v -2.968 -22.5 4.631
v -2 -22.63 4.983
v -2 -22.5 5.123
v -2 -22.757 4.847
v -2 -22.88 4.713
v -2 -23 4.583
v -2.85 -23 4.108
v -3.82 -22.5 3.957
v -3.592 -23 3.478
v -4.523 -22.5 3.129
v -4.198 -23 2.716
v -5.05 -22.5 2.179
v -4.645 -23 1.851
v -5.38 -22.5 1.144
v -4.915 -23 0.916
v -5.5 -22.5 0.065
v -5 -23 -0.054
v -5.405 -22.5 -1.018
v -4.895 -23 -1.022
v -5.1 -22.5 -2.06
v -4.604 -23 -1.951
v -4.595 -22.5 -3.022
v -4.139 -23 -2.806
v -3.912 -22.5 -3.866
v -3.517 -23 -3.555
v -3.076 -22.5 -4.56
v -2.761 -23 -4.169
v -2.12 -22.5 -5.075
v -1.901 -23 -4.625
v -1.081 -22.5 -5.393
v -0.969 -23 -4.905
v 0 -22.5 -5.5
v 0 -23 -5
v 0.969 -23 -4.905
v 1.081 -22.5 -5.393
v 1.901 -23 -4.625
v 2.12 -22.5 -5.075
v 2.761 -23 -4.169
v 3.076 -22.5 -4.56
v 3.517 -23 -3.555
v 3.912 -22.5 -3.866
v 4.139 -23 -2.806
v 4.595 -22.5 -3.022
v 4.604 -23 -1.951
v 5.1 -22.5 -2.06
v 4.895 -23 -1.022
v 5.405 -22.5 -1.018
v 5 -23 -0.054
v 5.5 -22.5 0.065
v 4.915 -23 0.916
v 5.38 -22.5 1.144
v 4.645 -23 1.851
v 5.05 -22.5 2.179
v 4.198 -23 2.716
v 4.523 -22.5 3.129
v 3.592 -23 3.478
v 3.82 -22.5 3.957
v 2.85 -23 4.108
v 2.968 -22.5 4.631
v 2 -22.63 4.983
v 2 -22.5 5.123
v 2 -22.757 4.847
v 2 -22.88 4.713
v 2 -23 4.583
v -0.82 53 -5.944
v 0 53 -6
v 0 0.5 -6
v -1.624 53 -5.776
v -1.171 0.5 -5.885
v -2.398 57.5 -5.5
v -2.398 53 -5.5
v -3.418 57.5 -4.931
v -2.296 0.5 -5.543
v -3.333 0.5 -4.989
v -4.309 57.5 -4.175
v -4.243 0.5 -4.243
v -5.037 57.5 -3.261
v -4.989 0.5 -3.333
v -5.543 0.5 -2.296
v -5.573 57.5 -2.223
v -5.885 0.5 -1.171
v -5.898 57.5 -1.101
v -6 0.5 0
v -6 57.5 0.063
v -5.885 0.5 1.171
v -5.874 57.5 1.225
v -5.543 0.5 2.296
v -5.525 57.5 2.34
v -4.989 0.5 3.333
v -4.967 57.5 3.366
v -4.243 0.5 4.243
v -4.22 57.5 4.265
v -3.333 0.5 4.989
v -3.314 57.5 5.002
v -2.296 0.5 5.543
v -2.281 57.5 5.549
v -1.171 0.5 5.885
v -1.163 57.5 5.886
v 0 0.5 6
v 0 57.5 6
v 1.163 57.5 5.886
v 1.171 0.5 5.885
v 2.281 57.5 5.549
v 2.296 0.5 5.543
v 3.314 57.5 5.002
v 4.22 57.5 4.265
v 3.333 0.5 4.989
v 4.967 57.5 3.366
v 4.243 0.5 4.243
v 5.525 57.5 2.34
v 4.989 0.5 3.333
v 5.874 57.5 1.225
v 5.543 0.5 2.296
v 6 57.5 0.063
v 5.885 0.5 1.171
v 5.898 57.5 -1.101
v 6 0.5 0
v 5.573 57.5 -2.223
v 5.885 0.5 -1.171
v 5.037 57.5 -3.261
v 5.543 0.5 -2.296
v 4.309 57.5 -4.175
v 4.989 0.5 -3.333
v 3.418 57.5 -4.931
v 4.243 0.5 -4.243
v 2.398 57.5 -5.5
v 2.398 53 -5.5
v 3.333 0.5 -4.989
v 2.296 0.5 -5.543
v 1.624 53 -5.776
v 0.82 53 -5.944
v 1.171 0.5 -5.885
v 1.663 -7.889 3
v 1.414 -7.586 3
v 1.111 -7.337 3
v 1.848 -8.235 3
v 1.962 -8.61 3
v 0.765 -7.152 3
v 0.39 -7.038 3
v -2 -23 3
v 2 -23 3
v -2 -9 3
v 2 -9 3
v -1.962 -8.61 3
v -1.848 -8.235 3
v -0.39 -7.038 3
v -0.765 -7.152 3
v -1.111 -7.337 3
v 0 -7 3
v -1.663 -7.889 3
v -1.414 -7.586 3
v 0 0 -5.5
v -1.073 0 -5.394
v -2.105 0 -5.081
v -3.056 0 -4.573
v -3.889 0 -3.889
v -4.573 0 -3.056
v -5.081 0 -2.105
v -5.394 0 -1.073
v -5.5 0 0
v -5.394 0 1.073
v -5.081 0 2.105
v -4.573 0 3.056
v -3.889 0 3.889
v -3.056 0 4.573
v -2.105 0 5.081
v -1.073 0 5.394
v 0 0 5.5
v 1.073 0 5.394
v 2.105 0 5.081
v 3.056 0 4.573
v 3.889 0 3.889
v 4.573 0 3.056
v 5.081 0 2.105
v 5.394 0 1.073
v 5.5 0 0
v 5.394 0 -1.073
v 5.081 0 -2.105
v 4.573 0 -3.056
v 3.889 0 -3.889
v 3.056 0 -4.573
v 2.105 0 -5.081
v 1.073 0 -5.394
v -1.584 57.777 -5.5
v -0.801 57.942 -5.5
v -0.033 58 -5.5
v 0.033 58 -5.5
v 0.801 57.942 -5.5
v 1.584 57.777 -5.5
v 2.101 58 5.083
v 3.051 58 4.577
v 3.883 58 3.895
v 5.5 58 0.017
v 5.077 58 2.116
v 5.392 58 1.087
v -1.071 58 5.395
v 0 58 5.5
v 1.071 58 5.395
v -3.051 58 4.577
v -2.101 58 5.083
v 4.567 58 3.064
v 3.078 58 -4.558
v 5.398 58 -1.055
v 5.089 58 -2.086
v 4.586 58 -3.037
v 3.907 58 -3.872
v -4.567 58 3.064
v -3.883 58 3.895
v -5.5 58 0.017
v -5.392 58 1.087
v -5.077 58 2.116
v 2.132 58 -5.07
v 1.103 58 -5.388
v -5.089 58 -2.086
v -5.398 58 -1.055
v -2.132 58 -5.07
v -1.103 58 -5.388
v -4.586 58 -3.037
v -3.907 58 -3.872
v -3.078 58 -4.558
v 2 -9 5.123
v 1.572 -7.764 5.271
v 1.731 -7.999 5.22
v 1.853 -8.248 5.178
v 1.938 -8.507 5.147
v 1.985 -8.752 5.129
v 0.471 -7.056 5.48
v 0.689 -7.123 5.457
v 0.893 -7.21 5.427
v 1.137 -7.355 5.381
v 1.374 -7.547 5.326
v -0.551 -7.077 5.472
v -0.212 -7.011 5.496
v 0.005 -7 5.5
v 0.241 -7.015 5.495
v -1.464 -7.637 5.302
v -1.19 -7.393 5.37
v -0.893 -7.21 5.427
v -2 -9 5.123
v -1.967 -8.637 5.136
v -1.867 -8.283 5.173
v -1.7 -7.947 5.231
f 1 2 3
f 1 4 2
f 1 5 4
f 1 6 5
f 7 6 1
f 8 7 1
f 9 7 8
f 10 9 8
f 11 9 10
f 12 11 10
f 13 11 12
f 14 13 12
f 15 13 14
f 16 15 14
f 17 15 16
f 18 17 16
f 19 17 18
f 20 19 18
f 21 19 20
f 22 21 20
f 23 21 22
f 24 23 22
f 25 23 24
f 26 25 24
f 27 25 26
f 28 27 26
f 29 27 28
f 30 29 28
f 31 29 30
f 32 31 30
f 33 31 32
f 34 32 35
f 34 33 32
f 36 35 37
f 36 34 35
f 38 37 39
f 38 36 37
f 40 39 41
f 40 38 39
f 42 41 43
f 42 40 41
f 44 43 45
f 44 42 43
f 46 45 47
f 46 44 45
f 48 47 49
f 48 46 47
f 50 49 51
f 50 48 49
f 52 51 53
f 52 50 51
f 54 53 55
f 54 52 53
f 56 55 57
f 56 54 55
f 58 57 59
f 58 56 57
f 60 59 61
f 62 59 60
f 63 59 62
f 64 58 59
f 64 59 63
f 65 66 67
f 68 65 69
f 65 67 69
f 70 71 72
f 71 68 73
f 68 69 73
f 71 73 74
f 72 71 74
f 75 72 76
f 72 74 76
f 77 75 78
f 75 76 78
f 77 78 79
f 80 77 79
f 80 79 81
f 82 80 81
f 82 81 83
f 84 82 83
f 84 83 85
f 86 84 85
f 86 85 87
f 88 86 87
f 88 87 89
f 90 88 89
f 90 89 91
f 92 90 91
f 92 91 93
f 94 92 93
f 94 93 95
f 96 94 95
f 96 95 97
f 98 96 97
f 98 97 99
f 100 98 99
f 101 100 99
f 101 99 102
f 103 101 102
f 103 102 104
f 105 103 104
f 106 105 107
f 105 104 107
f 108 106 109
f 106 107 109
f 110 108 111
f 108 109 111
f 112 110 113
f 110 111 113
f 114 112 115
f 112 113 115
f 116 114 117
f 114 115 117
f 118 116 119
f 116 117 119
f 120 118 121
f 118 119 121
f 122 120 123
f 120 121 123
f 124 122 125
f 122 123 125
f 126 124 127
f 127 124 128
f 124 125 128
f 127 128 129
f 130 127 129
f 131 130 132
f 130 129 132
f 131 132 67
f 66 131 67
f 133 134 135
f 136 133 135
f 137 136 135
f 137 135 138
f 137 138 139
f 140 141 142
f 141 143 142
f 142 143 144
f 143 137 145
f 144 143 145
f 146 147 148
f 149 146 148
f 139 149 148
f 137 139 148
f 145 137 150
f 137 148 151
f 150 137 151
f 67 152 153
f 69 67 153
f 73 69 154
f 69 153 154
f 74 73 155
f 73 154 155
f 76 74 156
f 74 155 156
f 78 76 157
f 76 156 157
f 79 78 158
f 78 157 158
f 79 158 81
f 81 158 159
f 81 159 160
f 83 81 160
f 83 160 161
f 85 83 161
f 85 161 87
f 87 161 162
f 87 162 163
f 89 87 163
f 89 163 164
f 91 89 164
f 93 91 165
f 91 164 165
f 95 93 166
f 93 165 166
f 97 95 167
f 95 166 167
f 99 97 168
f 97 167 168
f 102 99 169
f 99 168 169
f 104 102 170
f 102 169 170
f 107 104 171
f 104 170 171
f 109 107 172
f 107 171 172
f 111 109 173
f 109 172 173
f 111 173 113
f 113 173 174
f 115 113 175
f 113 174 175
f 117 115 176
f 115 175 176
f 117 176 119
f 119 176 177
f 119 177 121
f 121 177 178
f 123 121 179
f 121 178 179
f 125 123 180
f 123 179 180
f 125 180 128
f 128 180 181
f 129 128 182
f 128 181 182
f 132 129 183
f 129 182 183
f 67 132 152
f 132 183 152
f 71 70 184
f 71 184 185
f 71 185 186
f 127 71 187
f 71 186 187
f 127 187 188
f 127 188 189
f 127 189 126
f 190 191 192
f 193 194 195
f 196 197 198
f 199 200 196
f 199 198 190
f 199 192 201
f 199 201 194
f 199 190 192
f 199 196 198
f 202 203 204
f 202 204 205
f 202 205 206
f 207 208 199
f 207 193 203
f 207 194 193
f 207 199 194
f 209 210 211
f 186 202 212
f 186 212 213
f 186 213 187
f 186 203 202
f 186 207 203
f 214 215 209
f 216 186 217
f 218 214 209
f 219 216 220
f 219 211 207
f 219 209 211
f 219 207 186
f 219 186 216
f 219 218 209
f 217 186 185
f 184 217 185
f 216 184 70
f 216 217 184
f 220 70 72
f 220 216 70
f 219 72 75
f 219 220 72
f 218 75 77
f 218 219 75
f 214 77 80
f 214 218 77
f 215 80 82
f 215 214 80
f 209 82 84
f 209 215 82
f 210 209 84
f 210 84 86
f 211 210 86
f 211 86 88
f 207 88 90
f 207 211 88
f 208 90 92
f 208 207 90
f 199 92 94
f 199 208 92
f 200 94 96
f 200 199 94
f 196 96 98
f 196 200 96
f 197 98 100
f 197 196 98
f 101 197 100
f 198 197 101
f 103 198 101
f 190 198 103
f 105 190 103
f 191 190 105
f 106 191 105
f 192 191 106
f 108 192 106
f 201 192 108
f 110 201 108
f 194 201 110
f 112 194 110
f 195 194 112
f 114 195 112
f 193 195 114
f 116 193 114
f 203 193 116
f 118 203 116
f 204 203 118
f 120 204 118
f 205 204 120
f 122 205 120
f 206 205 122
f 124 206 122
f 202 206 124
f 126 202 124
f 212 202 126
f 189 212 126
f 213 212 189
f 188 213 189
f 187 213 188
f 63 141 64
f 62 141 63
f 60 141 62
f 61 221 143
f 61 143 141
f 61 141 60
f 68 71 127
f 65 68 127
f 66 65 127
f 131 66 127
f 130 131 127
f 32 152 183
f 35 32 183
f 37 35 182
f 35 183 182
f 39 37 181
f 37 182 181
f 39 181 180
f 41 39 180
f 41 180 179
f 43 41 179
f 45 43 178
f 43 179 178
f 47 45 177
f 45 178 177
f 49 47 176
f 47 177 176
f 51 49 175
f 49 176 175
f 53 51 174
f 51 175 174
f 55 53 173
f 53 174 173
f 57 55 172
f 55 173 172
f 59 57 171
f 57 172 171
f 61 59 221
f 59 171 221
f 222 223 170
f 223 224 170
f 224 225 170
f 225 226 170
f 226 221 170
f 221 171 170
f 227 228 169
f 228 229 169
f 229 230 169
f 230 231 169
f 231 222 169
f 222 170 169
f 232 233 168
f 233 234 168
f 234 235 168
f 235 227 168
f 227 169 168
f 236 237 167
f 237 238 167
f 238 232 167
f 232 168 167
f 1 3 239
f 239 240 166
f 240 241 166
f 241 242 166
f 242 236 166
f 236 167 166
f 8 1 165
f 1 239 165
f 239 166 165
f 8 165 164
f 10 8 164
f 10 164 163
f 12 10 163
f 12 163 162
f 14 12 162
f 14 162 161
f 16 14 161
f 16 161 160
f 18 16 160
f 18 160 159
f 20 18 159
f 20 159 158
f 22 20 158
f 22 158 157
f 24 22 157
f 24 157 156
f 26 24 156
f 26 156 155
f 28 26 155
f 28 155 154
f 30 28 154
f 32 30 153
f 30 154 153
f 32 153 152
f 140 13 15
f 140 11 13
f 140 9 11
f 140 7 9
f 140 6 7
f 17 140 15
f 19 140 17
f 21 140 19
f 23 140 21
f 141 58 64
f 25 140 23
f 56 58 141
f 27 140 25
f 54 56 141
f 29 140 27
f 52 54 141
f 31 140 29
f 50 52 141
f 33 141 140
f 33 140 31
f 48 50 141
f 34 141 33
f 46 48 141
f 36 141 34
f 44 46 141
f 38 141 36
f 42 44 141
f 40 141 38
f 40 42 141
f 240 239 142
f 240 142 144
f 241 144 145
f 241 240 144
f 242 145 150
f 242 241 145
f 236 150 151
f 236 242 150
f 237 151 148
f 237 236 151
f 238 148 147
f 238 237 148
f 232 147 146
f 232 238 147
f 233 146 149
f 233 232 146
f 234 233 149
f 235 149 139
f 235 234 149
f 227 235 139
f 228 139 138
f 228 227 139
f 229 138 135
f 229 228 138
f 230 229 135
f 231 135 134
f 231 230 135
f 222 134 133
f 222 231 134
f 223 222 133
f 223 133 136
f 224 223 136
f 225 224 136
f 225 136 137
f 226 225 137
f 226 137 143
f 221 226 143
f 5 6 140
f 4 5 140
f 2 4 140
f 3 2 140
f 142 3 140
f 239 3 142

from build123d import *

# Parameters (mm, degrees)
SCHIZZO1_R                   = 6
ESTRUSIONE_ESTRUSIONE1_DEPTH = 58
SCHIZZO2_R                   = 5.5
ESTRUSIONE_ESTRUSIONE2_DEPTH = 23
TAGLIO_ESTRUSIONE1_START     = -5.5
SCHIZZO3_W                   = 5
SCHIZZO3_H                   = 5
TAGLIO_ESTRUSIONE1_DEPTH     = 5
TAGLIO_ESTRUSIONE2_DEPTH     = 2.5
SMUSSO1_SIZE                 = 0.5


with BuildPart() as part:
    # Schizzo1 → Estrusione-Estrusione1 (new body)
    with BuildSketch(Plane(origin=(0, 0, 0), x_dir=(1, 0, 0), z_dir=(0, 1, 0))):
        with Locations(Location((0, 0, 0), (0, 0, 90))):
            Circle(SCHIZZO1_R)
    extrude(amount=ESTRUSIONE_ESTRUSIONE1_DEPTH)

    # Schizzo2 → Estrusione-Estrusione2 (add)
    with BuildSketch(Plane.XZ):
        with Locations(Location((0, 0, 0), (0, 0, 270))):
            Circle(SCHIZZO2_R)
    extrude(amount=ESTRUSIONE_ESTRUSIONE2_DEPTH)

    # Schizzo3 → Taglio-Estrusione1 (cut)
    with BuildSketch(Plane.XY.offset(TAGLIO_ESTRUSIONE1_START)):
        with Locations((0, 55.5)):
            Rectangle(SCHIZZO3_W, SCHIZZO3_H)
    extrude(amount=-TAGLIO_ESTRUSIONE1_DEPTH, mode=Mode.SUBTRACT)

    # Schizzo5 → Taglio-Estrusione2 (cut)
    with BuildSketch(Plane.XY.offset(5.5)):
        with BuildLine():
            Line((-2, -23), (-2, -9))
            ThreePointArc((-2, -9), (0, -7), (2, -9))
            Line((2, -9), (2, -23))
            ThreePointArc((2, -23), (0, -25), (-2, -23))
        make_face()
    extrude(amount=-TAGLIO_ESTRUSIONE2_DEPTH, mode=Mode.SUBTRACT)

    # Smusso1
    smusso1_edges = [part.edges().sort_by_distance(p)[0] for p in [
        (0, 0, 6),
        (0, 58, 6),
        (5.405049242, -23, -1.017567048),
    ]]
    chamfer(smusso1_edges, length=SMUSSO1_SIZE - 0.0001)  # a hair under: the kernel refuses the full size


solid = part.part
